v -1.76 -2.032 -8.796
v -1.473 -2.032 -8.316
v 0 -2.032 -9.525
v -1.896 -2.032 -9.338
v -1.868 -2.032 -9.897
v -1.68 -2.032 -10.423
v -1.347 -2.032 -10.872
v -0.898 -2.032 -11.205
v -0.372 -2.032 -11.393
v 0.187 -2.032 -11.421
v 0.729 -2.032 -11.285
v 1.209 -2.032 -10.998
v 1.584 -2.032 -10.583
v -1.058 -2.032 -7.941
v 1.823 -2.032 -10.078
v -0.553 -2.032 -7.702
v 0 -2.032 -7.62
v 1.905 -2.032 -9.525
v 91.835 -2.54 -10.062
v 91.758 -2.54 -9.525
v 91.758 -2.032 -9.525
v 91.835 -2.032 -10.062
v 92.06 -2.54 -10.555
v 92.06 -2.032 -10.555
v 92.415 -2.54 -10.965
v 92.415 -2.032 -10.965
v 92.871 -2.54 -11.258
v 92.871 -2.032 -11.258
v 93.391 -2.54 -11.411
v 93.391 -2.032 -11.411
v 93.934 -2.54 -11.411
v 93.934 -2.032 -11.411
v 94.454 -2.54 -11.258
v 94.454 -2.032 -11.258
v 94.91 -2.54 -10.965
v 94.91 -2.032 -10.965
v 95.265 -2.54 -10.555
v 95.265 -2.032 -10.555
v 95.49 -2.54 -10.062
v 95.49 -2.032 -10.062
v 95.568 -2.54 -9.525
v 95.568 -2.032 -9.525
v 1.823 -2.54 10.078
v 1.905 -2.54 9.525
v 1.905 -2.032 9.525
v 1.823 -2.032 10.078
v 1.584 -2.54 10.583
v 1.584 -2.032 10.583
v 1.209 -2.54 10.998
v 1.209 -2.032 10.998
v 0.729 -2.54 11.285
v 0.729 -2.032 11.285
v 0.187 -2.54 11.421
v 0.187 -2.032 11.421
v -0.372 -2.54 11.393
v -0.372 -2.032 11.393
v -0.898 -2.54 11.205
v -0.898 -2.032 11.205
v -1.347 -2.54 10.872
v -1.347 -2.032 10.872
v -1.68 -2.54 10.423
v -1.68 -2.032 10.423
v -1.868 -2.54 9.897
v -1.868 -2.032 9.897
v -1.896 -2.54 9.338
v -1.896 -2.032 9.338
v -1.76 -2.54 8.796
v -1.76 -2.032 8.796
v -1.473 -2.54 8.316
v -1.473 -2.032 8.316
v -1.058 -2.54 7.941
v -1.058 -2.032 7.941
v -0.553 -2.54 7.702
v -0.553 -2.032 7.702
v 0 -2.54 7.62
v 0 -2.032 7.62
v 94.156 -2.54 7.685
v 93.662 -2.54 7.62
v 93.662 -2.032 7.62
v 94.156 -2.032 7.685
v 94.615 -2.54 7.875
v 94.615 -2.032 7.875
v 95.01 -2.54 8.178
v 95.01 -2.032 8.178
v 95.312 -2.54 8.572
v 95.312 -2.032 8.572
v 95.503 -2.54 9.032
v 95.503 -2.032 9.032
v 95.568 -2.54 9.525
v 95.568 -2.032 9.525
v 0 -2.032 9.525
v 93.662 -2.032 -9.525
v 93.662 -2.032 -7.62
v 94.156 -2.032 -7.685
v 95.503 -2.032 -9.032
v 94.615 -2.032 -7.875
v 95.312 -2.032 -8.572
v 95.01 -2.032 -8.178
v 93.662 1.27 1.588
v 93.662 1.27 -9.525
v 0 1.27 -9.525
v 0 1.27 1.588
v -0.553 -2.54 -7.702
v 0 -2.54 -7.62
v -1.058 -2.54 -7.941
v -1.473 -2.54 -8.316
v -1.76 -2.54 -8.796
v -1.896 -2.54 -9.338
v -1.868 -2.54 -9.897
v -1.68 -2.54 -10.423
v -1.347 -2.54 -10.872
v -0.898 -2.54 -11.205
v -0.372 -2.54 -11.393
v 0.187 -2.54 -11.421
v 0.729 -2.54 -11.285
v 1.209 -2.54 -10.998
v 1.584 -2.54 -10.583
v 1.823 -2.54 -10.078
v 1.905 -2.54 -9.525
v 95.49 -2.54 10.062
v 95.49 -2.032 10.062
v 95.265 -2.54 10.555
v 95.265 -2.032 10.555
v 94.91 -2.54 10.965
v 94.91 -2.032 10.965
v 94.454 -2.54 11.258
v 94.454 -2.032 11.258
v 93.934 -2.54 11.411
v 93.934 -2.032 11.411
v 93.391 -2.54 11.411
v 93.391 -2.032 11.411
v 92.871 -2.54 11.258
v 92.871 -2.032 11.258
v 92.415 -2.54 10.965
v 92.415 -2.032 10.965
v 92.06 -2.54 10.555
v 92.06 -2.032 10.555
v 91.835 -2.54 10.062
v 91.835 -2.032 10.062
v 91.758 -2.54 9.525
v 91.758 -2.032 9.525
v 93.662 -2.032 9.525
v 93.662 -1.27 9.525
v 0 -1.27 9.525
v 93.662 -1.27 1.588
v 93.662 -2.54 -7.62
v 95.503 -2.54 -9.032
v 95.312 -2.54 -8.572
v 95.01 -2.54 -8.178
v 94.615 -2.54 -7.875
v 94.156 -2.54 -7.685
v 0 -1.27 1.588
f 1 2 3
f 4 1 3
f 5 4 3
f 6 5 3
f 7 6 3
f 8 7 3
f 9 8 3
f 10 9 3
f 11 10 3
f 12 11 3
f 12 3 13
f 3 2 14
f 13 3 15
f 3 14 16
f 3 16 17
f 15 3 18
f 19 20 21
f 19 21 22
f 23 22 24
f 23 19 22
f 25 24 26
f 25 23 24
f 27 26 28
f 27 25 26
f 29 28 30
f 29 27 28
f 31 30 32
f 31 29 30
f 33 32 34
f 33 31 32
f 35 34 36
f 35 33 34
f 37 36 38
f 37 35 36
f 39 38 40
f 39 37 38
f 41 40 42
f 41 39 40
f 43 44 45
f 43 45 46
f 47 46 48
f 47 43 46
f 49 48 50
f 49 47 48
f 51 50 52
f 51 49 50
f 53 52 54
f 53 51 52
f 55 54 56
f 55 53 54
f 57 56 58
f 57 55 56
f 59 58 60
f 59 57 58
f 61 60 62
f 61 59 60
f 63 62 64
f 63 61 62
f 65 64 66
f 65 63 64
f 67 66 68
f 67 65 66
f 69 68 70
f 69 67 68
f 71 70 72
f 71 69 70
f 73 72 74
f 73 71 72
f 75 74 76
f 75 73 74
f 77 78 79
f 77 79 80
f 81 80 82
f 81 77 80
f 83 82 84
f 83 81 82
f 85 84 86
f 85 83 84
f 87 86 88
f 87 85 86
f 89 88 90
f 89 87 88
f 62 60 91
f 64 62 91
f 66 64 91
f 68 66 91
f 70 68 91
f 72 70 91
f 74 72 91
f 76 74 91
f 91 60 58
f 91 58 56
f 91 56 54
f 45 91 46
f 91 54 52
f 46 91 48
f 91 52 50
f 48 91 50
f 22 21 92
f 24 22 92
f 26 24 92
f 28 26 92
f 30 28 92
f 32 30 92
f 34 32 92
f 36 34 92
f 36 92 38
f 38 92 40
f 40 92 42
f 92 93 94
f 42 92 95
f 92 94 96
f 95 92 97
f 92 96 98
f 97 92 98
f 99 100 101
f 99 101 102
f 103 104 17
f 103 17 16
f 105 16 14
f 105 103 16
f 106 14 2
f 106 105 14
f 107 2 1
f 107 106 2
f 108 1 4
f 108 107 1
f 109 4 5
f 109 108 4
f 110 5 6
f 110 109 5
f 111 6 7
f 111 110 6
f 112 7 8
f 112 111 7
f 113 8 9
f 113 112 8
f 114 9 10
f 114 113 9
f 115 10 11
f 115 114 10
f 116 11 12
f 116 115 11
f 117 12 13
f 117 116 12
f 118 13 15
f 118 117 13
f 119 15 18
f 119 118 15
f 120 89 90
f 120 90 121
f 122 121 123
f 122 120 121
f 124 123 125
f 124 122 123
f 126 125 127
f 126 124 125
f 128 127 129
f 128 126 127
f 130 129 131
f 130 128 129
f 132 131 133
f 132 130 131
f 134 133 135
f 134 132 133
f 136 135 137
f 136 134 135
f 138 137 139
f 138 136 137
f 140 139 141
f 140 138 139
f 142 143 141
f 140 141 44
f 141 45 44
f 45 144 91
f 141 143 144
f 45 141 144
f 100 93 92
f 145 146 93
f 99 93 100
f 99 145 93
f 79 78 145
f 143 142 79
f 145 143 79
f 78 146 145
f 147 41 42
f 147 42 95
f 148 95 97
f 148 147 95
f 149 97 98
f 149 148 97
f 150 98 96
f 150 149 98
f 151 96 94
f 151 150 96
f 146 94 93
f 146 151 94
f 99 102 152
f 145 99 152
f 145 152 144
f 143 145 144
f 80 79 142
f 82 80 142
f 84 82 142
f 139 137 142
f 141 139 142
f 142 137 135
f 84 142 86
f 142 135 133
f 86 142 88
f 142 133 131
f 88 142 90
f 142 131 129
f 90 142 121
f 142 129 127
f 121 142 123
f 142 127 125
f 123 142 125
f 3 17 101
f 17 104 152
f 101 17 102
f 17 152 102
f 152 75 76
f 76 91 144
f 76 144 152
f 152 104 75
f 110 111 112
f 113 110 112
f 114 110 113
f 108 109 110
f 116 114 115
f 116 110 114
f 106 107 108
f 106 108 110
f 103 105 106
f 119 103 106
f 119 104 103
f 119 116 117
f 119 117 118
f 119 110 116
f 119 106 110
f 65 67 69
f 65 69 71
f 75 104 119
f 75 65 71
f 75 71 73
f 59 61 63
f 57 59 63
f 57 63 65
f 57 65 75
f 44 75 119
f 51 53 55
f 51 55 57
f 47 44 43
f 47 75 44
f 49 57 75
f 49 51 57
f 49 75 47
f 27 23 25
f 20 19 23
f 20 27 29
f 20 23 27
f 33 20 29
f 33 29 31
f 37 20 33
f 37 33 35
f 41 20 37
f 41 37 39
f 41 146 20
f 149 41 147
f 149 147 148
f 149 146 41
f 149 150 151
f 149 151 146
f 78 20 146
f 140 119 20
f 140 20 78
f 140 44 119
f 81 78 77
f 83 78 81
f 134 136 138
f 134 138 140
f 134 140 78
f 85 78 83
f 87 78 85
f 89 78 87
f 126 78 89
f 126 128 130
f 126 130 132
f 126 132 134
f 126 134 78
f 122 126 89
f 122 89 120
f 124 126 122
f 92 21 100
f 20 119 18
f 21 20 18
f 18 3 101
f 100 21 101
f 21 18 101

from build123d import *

# Parameters (mm, degrees)
F1_DEPTH = 93.6625
F3_DEPTH = 0.508


with BuildPart() as f1:
    # F0 (on Right) → F1 (new body)
    with BuildSketch(Plane.YZ):
        Polygon((1.27, -9.525), (1.27, 1.5875), (-1.27, 1.5875), (-1.27, 9.525), (-2.54, 9.525), (-2.54, -9.525), align=None)
    extrude(amount=F1_DEPTH)

    # F2 (on face) → F3 (join)
    with BuildSketch(Plane.XZ.offset(2.54)):
        with BuildLine():
            Line((93.6625, 9.525), (93.6625, 7.62))
            ThreePointArc((93.6625, 7.62), (95.0095384182, 8.1779615818), (95.5675, 9.525))
            ThreePointArc((95.5675, 9.525), (93.6625, 11.43), (91.7575, 9.525))
            Line((91.7575, 9.525), (93.6625, 9.525))
        make_face()
        with BuildLine():
            ThreePointArc((91.7575, -9.525), (93.6625, -11.43), (95.5675, -9.525))
            ThreePointArc((95.5675, -9.525), (95.0095384182, -8.1779615818), (93.6625, -7.62))
            Line((93.6625, -7.62), (93.6625, -9.525))
            Line((93.6625, -9.525), (91.7575, -9.525))
        make_face()
        with BuildLine():
            ThreePointArc((0, -7.62), (-1.3470384182, -10.8720384182), (1.905, -9.525))
            Line((1.905, -9.525), (0, -9.525))
            Line((0, -9.525), (0, -7.62))
        make_face()
        with BuildLine():
            Line((0, 9.525), (1.905, 9.525))
            ThreePointArc((1.905, 9.525), (-1.3470384182, 10.8720384182), (0, 7.62))
            Line((0, 7.62), (0, 9.525))
        make_face()
    extrude(amount=-F3_DEPTH)


solid = f1.part
